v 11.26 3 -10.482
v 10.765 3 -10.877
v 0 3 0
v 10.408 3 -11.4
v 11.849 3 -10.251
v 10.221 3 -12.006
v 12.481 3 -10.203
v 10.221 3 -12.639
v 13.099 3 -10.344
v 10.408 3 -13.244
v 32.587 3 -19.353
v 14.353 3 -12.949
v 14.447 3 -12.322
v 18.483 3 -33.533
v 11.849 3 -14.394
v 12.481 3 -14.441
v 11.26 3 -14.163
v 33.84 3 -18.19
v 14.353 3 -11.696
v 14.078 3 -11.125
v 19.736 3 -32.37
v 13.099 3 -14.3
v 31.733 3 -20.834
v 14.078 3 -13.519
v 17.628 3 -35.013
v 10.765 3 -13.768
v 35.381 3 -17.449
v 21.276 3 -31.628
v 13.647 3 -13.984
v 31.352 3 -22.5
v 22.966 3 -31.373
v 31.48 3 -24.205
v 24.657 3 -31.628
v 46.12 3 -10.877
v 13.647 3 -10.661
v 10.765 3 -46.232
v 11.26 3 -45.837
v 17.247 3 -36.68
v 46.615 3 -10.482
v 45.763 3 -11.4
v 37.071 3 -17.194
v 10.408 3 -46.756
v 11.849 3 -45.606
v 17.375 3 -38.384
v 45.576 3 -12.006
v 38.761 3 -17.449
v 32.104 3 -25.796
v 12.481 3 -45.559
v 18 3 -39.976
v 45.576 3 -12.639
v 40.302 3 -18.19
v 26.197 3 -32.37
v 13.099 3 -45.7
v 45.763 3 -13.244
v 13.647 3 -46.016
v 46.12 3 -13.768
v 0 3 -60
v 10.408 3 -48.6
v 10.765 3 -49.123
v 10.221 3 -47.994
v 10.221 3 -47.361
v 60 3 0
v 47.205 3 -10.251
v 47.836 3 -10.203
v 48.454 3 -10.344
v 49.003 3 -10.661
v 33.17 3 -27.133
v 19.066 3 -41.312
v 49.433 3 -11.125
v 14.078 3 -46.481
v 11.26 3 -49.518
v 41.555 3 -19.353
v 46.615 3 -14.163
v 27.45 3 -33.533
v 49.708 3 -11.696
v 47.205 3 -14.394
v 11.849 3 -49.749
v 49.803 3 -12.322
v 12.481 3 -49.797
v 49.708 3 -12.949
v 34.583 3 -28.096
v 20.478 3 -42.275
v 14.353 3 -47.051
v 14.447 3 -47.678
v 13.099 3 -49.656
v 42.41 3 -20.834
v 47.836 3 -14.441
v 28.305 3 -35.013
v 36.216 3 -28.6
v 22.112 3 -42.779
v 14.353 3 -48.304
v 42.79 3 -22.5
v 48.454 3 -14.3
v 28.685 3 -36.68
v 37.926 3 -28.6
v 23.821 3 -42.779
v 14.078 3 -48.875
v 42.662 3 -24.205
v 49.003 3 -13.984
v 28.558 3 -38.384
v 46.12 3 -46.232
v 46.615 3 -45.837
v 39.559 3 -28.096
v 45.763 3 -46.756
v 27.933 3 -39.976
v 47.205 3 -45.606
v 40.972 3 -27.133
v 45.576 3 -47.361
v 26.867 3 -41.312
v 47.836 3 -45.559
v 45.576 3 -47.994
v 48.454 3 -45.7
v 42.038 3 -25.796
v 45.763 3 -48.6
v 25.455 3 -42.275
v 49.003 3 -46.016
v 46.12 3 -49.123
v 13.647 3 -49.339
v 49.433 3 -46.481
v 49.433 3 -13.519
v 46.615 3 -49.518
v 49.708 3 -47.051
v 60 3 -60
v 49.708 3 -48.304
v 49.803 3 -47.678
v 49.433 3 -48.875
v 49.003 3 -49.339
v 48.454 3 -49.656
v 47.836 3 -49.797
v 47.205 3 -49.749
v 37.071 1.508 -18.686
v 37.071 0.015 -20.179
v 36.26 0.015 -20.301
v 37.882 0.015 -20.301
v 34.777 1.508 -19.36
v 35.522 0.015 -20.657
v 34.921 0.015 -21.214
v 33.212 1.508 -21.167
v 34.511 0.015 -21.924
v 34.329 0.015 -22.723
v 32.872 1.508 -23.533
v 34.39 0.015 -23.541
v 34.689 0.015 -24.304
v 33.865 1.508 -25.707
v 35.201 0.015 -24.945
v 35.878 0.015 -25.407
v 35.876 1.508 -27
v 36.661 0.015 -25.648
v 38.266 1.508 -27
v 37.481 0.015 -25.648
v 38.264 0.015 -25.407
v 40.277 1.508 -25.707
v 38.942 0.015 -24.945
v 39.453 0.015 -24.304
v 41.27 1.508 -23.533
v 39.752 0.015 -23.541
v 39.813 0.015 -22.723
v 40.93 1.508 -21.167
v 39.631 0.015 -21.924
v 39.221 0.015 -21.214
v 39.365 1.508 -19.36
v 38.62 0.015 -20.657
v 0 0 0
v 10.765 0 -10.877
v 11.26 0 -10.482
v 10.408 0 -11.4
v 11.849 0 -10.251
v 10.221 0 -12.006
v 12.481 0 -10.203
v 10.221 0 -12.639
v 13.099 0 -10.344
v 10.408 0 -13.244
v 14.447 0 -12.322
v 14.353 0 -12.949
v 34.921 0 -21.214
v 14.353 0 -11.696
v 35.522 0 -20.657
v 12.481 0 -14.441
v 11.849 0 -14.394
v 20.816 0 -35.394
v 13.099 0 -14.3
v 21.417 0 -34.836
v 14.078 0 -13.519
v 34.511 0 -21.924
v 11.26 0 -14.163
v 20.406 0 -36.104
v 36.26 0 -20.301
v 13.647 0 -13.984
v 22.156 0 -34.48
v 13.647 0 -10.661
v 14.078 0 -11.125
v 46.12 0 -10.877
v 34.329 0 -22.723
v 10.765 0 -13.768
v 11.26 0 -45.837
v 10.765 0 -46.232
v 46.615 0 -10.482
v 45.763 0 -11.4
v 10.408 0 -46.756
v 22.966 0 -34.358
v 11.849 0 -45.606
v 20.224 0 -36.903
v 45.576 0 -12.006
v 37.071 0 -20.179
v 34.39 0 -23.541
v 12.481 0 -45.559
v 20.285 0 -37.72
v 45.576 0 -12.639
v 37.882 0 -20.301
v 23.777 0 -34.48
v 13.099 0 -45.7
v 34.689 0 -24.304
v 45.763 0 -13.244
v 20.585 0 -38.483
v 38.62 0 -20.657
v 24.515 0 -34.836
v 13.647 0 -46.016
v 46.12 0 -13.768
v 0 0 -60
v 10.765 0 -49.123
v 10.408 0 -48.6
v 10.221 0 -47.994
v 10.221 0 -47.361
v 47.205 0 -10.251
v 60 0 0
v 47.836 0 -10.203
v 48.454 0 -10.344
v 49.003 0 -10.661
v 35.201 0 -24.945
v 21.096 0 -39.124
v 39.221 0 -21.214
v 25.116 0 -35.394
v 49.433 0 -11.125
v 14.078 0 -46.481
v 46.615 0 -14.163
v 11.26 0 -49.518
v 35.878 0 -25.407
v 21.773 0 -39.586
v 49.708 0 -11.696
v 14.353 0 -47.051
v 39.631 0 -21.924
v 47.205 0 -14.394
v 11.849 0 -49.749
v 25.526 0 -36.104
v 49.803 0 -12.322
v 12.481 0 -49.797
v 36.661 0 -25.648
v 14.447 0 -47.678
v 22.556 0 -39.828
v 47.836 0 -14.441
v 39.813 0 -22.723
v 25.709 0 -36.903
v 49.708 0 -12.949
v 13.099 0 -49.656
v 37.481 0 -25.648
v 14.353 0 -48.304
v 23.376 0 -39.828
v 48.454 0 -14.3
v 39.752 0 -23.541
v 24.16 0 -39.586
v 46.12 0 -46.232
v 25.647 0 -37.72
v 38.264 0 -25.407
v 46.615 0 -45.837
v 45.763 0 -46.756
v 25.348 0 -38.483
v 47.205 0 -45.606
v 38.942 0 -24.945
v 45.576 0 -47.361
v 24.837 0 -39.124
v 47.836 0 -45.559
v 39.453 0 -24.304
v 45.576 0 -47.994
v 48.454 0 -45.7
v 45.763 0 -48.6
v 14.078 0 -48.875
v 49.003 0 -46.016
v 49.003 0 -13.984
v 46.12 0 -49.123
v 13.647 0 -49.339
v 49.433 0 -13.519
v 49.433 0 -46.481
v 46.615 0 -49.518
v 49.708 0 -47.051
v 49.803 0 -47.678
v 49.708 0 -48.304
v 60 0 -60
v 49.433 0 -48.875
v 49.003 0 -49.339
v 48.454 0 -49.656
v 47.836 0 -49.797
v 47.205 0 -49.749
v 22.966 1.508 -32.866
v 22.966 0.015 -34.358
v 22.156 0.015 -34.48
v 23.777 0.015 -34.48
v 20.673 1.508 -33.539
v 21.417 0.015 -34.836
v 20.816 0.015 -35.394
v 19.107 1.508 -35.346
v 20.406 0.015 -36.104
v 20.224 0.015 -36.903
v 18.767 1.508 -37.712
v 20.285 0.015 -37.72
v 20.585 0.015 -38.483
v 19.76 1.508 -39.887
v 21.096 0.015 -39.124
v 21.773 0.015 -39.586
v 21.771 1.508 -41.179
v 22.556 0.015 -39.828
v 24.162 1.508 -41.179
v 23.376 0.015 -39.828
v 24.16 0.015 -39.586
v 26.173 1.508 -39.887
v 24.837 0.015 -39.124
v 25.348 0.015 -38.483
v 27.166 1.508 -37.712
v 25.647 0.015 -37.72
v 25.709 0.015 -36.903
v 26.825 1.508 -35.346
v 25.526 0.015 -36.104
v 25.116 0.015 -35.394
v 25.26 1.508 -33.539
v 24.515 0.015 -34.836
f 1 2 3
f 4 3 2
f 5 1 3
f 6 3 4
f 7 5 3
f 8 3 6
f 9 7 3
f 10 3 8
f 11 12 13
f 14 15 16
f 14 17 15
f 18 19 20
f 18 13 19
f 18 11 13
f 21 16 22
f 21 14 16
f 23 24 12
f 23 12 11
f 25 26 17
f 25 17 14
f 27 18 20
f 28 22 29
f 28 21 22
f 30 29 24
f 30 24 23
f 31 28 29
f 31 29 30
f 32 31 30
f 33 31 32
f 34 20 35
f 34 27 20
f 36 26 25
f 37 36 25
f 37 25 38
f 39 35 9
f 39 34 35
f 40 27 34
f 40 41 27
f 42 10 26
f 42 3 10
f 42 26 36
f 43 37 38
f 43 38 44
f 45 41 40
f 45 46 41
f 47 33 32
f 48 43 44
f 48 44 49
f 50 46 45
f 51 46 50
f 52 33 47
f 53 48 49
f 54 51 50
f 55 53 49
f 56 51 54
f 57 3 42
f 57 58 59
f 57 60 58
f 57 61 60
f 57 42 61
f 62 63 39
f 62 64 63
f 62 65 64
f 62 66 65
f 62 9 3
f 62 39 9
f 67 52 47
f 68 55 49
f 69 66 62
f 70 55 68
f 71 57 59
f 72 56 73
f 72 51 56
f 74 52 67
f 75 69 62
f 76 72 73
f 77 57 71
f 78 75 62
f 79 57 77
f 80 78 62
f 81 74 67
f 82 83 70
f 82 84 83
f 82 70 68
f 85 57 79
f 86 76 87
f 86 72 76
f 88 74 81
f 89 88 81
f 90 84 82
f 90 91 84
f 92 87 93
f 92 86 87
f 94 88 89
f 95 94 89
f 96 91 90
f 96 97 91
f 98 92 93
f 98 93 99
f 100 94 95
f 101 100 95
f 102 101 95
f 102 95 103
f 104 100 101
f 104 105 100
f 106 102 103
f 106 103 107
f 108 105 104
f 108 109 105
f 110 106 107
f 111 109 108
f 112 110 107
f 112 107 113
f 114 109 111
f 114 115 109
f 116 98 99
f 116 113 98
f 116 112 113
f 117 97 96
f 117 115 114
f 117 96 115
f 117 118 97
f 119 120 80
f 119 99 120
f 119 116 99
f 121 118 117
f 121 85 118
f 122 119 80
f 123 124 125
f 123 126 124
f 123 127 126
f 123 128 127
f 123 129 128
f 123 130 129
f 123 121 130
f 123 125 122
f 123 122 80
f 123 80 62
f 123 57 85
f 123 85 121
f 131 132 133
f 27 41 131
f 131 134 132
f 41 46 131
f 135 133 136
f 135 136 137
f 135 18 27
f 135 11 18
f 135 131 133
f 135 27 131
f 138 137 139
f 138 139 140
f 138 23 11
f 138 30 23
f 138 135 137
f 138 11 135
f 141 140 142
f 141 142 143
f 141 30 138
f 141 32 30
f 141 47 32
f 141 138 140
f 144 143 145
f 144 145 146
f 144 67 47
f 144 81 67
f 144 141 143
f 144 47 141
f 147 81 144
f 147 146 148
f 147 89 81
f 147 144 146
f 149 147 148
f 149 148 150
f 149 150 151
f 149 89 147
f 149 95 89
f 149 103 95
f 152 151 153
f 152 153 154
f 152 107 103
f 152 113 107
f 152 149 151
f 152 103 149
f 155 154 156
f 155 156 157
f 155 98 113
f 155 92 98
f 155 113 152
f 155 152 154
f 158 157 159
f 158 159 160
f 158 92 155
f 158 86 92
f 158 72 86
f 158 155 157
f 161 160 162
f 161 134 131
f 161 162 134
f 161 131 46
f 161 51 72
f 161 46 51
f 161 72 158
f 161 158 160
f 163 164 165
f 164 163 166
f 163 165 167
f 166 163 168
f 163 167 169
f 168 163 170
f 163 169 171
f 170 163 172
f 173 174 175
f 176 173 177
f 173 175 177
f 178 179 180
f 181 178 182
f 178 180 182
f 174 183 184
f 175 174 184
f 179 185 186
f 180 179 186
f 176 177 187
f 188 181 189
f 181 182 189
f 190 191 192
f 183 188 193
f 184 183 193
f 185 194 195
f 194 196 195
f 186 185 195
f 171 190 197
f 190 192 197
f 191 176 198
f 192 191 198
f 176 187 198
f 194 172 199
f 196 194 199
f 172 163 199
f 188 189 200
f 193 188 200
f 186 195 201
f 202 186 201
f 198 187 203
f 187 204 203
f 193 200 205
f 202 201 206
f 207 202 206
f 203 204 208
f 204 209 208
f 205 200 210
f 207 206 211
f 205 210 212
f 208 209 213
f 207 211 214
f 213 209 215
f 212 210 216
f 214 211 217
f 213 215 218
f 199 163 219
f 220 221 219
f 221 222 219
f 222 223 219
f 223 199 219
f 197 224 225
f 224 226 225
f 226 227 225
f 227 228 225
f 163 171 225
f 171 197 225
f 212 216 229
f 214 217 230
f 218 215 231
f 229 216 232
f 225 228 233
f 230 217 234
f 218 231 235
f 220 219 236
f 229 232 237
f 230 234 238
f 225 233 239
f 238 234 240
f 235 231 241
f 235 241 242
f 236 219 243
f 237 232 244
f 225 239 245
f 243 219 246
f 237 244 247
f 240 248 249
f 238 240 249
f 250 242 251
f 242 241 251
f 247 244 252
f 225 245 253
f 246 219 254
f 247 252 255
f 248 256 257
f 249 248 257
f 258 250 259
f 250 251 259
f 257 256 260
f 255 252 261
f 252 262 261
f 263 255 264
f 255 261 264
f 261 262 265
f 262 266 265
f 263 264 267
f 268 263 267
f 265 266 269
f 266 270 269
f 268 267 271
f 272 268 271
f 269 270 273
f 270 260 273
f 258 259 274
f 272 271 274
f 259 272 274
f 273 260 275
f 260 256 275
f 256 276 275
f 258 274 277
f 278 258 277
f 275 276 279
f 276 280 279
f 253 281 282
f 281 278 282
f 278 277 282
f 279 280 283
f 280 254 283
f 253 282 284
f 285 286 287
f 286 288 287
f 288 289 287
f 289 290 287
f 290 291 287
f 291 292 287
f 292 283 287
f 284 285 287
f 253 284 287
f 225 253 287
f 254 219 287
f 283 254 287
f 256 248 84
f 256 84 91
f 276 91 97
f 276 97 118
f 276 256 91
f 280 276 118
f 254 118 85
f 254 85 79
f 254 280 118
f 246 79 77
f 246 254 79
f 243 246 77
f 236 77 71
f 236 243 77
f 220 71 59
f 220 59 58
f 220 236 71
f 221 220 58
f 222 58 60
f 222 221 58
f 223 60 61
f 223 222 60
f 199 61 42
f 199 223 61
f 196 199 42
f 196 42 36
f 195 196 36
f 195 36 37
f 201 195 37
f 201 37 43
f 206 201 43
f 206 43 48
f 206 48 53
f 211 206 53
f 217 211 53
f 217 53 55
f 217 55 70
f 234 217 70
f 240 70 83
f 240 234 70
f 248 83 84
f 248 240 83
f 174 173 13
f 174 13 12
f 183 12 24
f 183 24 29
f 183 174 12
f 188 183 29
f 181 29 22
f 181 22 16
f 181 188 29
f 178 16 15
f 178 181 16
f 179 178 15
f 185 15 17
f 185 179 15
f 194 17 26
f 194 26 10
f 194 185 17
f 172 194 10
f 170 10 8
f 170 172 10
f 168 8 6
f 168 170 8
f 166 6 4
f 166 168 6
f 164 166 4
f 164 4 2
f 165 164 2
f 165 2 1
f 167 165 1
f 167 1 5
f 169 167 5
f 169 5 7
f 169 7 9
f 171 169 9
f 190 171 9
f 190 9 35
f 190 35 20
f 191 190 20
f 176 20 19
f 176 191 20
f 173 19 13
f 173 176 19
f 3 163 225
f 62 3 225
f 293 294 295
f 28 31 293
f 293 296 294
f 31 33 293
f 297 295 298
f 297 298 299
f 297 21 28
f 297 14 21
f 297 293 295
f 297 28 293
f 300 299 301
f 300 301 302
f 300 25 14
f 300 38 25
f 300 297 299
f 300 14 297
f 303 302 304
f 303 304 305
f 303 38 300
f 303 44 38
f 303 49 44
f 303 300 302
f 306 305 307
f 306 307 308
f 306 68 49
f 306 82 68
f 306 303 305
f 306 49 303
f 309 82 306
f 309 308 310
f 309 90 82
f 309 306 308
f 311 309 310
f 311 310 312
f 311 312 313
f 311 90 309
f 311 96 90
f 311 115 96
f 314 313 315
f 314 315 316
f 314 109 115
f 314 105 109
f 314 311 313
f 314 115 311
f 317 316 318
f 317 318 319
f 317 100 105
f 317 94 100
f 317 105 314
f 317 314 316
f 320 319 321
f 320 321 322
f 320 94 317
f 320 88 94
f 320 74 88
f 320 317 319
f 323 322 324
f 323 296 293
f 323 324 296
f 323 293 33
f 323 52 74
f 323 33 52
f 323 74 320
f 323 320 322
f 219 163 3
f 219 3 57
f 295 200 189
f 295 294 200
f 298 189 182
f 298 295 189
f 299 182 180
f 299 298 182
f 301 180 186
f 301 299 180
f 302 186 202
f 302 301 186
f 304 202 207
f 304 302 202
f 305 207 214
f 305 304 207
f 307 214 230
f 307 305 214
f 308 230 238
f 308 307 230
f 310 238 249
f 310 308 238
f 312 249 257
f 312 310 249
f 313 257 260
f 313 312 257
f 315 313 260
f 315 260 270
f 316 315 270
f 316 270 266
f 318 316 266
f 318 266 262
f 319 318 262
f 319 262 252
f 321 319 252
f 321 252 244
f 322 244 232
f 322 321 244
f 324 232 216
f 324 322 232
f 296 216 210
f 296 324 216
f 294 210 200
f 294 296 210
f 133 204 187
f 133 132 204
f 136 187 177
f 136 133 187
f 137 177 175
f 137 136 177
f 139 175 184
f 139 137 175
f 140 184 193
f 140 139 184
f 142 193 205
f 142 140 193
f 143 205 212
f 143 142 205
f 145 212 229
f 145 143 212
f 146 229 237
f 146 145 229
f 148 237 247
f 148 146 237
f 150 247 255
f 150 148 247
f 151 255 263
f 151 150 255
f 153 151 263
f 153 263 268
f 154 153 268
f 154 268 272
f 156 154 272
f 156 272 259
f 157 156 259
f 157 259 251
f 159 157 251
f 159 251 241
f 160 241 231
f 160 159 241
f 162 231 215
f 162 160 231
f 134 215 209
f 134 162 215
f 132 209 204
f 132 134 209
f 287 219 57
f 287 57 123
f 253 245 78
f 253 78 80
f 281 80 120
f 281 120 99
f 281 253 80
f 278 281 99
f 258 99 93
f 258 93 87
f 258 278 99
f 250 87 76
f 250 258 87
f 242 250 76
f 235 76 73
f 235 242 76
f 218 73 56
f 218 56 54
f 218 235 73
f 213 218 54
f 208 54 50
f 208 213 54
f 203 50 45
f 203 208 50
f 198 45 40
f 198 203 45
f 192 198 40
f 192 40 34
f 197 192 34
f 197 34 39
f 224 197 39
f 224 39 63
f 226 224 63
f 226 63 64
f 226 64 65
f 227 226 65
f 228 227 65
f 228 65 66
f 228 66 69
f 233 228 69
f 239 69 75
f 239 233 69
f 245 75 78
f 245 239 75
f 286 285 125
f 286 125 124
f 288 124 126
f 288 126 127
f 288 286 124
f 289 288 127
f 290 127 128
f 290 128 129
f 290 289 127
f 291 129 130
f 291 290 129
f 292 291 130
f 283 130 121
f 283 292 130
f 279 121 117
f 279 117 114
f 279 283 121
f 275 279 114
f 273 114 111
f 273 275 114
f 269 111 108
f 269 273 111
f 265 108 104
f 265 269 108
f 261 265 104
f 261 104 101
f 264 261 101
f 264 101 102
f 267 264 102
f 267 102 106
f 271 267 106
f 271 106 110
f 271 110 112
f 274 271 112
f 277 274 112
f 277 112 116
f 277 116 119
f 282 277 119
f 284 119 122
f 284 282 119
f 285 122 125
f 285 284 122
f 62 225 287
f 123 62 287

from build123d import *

# Parameters (mm, degrees)
CROQUIS1_W                                  = 60
CROQUIS1_H                                  = 60
CROQUIS1_R                                  = 2.125
CROQUIS1_R_2                                = 0.5
SALIENTE_EXTRUIR1_DEPTH                     = 3
AVELLANADO_PARA_TORNILLO_CON_CABEZA_2_COUNT = 2
AVELLANADO_PARA_TORNILLO_CON_CABEZA_2_PITCH = 19.999930309


with BuildPart() as part:
    # Croquis1 → Saliente-Extruir1 (new body)
    with BuildSketch(Plane(origin=(0, 0, 0), x_dir=(1, 0, 0), z_dir=(0, 1, 0))):
        with Locations((30, 30)):
            Rectangle(CROQUIS1_W, CROQUIS1_H)
        with Locations((12.32233047, 47.67766953)):
            Circle(CROQUIS1_R, mode=Mode.SUBTRACT)
        with Locations((12.32233047, 12.32233047)):
            Circle(CROQUIS1_R, mode=Mode.SUBTRACT)
        with Locations((47.67766953, 12.32233047)):
            Circle(CROQUIS1_R, mode=Mode.SUBTRACT)
        with Locations((47.67766953, 47.67766953)):
            Circle(CROQUIS1_R, mode=Mode.SUBTRACT)
        with Locations((22.966364616, 37.108303123)):
            Circle(CROQUIS1_R_2, mode=Mode.SUBTRACT)
        with Locations((37.071067812, 22.928932188)):
            Circle(CROQUIS1_R_2, mode=Mode.SUBTRACT)
    extrude(amount=SALIENTE_EXTRUIR1_DEPTH)

    # Croquis8 → Avellanado para tornillo con cabeza avellanada de clavija hexagonal de M53 (revolve, cut)
    with BuildSketch(Plane(origin=(22.966364616, 3, -37.108303123), x_dir=(0, 0, 1), z_dir=(1, 0, 0))):
        Polygon((0, 0), (0, 3), (2.75, 3), (2.75, 2.985), (5.735, 0), align=None)
    avellanado_para_tornillo_con_cabeza_avel = revolve(axis=Axis((22.966364616, 9.35, -37.108303123), (0, -1, 0)), mode=Mode.SUBTRACT)

    # Avellanado para tornillo con cabeza  2: Avellanado para tornillo con cabeza avellanada de clavija hexagonal de M53 ×2
    with Locations(*[Vector(0.705237617, 0, 0.708971017) * (i * AVELLANADO_PARA_TORNILLO_CON_CABEZA_2_PITCH) for i in range(1, AVELLANADO_PARA_TORNILLO_CON_CABEZA_2_COUNT)]):
        add(avellanado_para_tornillo_con_cabeza_avel, mode=Mode.SUBTRACT)


solid = part.part
